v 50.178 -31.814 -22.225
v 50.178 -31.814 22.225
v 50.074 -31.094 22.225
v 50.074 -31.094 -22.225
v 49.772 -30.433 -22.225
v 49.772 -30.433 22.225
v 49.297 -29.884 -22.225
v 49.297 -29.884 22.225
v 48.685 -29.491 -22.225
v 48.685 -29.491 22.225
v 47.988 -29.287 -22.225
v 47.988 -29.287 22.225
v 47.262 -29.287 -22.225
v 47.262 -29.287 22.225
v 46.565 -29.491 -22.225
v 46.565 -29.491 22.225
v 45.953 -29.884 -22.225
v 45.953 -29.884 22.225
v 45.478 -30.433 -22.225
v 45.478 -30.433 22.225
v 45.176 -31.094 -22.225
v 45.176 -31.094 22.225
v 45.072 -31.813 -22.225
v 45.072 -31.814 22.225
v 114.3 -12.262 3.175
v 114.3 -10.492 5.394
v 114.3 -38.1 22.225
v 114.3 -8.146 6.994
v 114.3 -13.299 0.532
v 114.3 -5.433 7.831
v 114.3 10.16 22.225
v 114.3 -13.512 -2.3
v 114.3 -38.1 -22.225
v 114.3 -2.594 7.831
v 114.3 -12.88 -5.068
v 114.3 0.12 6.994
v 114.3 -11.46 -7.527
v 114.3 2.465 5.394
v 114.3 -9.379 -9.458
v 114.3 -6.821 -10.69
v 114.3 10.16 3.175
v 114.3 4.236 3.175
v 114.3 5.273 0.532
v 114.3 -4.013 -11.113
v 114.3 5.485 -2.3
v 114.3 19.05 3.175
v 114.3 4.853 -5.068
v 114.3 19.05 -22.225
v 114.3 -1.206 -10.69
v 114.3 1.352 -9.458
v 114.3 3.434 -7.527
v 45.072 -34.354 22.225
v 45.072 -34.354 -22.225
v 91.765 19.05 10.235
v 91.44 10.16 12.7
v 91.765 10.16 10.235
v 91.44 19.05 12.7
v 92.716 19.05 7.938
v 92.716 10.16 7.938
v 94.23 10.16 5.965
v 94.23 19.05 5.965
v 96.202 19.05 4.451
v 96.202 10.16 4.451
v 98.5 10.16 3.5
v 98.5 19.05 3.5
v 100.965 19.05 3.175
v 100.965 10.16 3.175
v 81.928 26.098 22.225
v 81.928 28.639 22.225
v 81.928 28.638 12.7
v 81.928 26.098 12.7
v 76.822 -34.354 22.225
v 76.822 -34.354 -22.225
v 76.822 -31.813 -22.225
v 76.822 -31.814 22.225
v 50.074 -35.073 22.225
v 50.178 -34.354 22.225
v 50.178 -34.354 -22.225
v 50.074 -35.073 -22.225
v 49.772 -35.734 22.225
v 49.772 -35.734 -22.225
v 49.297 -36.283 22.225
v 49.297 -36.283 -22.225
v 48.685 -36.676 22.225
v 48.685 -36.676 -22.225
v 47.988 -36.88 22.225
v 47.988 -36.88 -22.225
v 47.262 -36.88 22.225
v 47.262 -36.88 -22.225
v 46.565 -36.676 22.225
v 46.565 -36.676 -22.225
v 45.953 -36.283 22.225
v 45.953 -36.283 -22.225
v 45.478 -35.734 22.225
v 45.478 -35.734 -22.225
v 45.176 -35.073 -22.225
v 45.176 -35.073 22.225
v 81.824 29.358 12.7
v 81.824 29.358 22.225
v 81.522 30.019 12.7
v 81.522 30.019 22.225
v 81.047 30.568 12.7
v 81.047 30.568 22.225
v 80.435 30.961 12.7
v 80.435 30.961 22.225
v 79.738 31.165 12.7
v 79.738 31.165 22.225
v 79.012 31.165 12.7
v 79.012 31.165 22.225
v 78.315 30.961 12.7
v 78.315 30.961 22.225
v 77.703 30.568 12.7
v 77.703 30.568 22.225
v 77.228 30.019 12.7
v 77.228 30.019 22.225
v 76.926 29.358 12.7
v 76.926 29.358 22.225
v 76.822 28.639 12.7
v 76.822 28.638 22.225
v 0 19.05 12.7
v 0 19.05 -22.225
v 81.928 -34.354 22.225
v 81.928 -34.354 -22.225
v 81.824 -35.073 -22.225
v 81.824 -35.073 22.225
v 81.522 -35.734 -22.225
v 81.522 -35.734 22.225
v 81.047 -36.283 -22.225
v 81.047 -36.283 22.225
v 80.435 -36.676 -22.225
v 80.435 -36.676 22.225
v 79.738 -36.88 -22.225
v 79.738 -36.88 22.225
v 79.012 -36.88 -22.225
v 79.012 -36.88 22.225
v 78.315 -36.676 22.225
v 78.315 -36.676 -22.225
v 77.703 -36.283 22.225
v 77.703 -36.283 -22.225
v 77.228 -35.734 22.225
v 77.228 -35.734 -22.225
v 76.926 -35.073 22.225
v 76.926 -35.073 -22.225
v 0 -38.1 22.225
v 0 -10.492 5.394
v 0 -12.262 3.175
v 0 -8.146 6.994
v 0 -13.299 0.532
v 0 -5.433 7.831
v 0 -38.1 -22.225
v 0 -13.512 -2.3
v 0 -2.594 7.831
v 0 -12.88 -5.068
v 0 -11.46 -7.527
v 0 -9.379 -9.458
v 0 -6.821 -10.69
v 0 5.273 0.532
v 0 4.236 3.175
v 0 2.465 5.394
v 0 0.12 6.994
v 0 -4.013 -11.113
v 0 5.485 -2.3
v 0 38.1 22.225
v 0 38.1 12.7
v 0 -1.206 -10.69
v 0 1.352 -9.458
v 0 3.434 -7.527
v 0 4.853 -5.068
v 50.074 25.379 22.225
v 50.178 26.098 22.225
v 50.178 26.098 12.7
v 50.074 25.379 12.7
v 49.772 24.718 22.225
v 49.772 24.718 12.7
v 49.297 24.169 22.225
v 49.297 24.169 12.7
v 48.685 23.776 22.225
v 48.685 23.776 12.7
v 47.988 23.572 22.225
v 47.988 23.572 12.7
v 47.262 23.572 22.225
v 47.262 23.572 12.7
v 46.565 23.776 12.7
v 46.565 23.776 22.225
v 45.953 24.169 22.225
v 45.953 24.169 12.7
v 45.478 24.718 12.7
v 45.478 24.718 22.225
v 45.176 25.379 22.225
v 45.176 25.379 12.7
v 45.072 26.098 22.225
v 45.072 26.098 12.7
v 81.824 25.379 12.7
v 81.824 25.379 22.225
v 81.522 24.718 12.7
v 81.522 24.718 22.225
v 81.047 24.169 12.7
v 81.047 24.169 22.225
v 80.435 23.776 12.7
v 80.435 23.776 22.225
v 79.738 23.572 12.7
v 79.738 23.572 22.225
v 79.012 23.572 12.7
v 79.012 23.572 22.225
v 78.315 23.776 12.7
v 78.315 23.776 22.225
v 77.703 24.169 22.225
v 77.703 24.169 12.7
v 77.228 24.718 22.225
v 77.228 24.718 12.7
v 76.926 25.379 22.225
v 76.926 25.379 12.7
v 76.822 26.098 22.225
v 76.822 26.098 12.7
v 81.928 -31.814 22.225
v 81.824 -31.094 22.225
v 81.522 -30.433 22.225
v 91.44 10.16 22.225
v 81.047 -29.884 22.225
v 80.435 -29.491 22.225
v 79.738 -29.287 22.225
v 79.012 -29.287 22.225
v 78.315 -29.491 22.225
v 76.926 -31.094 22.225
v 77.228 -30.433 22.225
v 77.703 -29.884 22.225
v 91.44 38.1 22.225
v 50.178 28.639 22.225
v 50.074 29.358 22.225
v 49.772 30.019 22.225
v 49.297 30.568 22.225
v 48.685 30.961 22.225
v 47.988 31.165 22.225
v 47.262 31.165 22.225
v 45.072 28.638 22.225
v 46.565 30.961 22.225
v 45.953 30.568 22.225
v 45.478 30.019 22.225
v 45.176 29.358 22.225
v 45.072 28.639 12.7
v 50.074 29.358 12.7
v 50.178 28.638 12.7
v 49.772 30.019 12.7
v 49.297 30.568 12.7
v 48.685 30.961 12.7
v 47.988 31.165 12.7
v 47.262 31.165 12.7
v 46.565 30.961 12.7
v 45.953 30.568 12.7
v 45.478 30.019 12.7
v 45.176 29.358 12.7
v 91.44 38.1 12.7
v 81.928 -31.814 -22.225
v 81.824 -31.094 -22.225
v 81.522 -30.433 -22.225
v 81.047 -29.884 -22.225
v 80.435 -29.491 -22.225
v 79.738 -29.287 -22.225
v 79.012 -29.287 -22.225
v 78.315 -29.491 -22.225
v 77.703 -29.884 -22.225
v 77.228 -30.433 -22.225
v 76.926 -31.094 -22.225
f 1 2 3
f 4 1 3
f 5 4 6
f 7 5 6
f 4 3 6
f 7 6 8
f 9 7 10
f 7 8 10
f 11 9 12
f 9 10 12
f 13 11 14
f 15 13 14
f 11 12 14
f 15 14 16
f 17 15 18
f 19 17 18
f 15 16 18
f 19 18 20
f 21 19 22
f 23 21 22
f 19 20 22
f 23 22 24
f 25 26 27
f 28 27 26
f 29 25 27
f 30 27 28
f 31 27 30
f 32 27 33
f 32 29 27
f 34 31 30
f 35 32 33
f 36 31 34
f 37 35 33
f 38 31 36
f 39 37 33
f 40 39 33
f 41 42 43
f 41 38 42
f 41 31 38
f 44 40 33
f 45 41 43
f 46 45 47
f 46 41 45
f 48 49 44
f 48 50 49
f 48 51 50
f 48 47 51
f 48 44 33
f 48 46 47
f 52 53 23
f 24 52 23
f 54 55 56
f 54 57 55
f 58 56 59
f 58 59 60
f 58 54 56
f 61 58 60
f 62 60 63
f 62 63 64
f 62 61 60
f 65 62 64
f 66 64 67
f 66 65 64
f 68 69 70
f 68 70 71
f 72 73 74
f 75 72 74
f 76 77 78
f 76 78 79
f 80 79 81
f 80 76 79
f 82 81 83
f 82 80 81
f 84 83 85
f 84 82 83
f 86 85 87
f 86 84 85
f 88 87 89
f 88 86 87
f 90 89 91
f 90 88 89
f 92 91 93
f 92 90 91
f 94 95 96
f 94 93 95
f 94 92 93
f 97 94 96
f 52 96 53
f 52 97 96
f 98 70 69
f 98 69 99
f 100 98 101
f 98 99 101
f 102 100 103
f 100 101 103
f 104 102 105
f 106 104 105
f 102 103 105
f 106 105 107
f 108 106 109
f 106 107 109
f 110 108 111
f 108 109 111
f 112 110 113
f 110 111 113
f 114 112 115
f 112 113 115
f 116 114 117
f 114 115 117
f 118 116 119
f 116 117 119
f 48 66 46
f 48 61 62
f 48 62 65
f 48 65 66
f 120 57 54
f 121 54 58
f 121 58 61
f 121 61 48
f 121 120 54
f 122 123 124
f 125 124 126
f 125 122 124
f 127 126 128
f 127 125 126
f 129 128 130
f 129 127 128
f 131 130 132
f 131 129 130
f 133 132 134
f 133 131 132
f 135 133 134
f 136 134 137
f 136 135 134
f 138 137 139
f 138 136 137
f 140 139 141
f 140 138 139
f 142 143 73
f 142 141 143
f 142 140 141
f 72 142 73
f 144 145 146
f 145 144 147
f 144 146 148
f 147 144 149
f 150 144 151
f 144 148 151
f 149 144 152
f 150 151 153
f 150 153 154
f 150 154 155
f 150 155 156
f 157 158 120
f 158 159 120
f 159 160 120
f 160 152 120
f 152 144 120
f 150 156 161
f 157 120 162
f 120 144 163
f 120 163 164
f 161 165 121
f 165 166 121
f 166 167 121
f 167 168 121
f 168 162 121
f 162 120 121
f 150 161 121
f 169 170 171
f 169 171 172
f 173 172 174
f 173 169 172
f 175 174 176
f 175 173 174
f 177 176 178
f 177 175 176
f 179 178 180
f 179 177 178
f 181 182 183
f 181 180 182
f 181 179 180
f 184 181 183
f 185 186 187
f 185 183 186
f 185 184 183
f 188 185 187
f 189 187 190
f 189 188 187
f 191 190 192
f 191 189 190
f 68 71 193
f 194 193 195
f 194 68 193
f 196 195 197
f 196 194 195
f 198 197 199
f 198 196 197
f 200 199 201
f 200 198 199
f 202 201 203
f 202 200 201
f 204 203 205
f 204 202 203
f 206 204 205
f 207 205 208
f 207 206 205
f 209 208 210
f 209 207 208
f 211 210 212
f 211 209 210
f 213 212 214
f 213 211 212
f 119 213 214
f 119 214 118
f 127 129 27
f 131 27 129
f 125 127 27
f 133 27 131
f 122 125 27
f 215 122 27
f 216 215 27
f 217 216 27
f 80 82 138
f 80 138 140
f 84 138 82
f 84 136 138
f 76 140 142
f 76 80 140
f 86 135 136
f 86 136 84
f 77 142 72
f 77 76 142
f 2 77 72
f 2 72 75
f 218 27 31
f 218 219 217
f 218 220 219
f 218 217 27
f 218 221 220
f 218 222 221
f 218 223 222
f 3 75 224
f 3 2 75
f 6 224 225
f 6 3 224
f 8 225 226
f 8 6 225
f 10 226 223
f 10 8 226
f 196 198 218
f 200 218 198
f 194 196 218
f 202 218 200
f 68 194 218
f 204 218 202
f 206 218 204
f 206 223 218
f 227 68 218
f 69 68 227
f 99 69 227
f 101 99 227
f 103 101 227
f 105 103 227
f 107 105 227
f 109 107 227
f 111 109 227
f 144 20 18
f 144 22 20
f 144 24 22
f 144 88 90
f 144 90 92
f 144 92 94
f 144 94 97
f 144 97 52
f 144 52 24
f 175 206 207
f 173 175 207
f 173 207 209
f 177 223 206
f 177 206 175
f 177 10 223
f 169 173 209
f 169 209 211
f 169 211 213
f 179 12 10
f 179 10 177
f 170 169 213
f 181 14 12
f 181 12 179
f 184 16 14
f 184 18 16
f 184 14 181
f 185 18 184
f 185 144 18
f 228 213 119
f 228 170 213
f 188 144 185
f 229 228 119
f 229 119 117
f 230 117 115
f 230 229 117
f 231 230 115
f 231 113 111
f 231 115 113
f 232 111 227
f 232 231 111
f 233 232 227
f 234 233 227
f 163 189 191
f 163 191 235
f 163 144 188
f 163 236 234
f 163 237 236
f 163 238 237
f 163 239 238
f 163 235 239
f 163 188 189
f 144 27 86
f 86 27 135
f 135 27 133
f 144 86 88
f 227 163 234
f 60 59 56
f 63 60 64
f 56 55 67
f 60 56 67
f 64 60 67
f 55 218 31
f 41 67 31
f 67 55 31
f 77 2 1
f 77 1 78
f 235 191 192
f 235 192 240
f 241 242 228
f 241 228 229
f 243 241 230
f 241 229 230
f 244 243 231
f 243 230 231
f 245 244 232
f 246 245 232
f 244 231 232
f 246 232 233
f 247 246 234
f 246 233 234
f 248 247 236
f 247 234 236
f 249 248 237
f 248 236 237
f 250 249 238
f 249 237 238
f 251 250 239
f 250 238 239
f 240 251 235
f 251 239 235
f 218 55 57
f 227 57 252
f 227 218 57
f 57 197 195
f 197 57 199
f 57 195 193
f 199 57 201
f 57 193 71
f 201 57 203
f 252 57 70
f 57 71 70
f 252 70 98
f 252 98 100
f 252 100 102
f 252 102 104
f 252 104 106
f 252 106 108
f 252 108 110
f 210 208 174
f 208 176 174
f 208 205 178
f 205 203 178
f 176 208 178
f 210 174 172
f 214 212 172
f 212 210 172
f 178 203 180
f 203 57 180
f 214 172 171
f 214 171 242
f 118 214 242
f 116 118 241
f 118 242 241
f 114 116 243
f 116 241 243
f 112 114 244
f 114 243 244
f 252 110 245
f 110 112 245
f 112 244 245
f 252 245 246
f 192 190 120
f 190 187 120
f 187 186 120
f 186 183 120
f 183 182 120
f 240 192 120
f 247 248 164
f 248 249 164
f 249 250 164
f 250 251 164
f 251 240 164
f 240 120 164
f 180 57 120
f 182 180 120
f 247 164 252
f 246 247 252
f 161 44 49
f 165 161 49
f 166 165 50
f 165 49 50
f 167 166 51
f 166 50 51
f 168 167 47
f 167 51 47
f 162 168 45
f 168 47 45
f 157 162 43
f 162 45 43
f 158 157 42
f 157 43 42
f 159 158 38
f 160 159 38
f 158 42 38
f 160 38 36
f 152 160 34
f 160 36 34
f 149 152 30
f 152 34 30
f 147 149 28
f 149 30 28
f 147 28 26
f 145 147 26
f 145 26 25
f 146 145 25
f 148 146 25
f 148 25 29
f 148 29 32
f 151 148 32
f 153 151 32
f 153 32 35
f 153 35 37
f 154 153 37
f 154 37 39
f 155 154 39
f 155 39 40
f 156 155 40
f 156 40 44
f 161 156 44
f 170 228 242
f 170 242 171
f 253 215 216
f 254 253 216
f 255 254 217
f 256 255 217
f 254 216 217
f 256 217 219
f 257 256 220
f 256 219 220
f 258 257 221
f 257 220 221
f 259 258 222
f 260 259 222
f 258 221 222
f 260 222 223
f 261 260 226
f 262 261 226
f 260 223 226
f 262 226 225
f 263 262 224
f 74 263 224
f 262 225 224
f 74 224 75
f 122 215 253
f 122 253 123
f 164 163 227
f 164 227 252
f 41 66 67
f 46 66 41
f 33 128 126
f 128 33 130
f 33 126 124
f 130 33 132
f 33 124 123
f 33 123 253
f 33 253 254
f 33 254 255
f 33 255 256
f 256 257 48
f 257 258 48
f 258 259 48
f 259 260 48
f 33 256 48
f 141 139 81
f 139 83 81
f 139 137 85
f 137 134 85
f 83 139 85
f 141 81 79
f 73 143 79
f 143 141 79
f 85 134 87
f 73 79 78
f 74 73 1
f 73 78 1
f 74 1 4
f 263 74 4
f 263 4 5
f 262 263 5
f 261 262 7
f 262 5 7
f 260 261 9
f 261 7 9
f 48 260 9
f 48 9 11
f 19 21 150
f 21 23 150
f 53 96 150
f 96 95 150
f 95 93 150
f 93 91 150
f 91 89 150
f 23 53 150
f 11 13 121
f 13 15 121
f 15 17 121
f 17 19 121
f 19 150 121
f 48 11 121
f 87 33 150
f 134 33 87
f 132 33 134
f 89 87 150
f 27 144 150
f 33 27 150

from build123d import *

# Parameters (mm, degrees)
SKETCH1_W              = 44.45
SKETCH1_H              = 76.2
BOSS_EXTRUDE1_DEPTH    = 114.3
CUT_EXTRUDE1_REACH     = 124.516
SKETCH2_R              = 9.525
SKETCH3_W              = 22.86
SKETCH3_H              = 27.94
CUT_EXTRUDE2_DEPTH     = 19.05
CUT_EXTRUDE3_REACH     = 124.516
SKETCH4_W              = 34.925
SKETCH4_H              = 19.05
FILLET1_R              = 9.525
F_10_CLEARANCE_HOLE1_D = 5.1054
CUT_EXTRUDE4_REACH     = 130.421


with BuildPart() as part:
    # Sketch1 → Boss-Extrude1 (new body)
    with BuildSketch(Plane(origin=(0, 0, 0), x_dir=(0, 0, -1), z_dir=(1, 0, 0))):
        Rectangle(SKETCH1_W, SKETCH1_H)
    extrude(amount=BOSS_EXTRUDE1_DEPTH)

    # Sketch2 → Cut-Extrude1 (cut, up to next)
    with BuildSketch(Plane(origin=(114.3, 0, 0), x_dir=(0, 0, -1), z_dir=(1, 0, 0)), mode=Mode.PRIVATE) as cut_extrude1_sk1:
        with Locations((1.588, -4.0132)):
            Circle(SKETCH2_R)
    cut_extrude1_tool1 = extrude(cut_extrude1_sk1.sketch, amount=-CUT_EXTRUDE1_REACH, mode=Mode.PRIVATE) & part.part
    add(cut_extrude1_tool1.solids().sort_by_distance((114.3, -4.0132, -1.588))[0], mode=Mode.SUBTRACT)

    # Sketch3 → Cut-Extrude2 (cut)
    with BuildSketch(Plane.XY.offset(22.225)):
        with Locations((102.87, 24.13)):
            Rectangle(SKETCH3_W, SKETCH3_H)
    extrude(amount=-CUT_EXTRUDE2_DEPTH, mode=Mode.SUBTRACT)

    # Sketch4 → Cut-Extrude3 (cut, up to next)
    with BuildSketch(Plane(origin=(0, 0, 0), x_dir=(0, 0, -1), z_dir=(1, 0, 0)), mode=Mode.PRIVATE) as cut_extrude3_sk1:
        with Locations((4.7625, 28.575)):
            Rectangle(SKETCH4_W, SKETCH4_H)
    cut_extrude3_tool1 = extrude(cut_extrude3_sk1.sketch, amount=CUT_EXTRUDE3_REACH, mode=Mode.PRIVATE) & part.part
    add(cut_extrude3_tool1.solids().sort_by_distance((0, 28.575, -4.7625))[0], mode=Mode.SUBTRACT)

    # Fillet1
    fillet1_edges = [part.edges().sort_by_distance(p)[0] for p in [
        (91.44, 14.605, 3.175),
    ]]
    fillet(fillet1_edges, radius=FILLET1_R)

    # #10 Clearance Hole1 (through all)
    with Locations(Plane(origin=(0, 0, -22.225), x_dir=(-1, 0, 0), z_dir=(0, 0, -1))):
        with Locations((-47.625, 28.6385), (-79.375, -31.8135), (-47.625, -31.8135), (-79.375, 28.6385)):
            Hole(F_10_CLEARANCE_HOLE1_D / 2)

    # Sketch9 → Cut-Extrude4 (cut, up to next)
    with BuildSketch(Plane.XY.offset(22.225), mode=Mode.PRIVATE) as cut_extrude4_sk1:
        with BuildLine():
            Line((50.1777, 28.6385), (50.1777, 26.0985))
            ThreePointArc((50.1777, 26.0985), (47.625, 23.5458), (45.0723, 26.0985))
            Line((45.0723, 26.0985), (45.0723, 28.6385))
            ThreePointArc((45.0723, 28.6385), (47.625, 31.1912), (50.1777, 28.6385))
        make_face()
    cut_extrude4_tool1 = extrude(cut_extrude4_sk1.sketch, amount=-CUT_EXTRUDE4_REACH, mode=Mode.PRIVATE) & part.part
    # Sketch9 → Cut-Extrude4 (cut, up to next)
    with BuildSketch(Plane.XY.offset(22.225), mode=Mode.PRIVATE) as cut_extrude4_sk2:
        with BuildLine():
            Line((81.9277, 28.6385), (81.9277, 26.0985))
            ThreePointArc((81.9277, 26.0985), (79.375, 23.5458), (76.8223, 26.0985))
            Line((76.8223, 26.0985), (76.8223, 28.6385))
            ThreePointArc((76.8223, 28.6385), (79.375, 31.1912), (81.9277, 28.6385))
        make_face()
    cut_extrude4_tool2 = extrude(cut_extrude4_sk2.sketch, amount=-CUT_EXTRUDE4_REACH, mode=Mode.PRIVATE) & part.part
    # Sketch9 → Cut-Extrude4 (cut, up to next)
    with BuildSketch(Plane.XY.offset(22.225), mode=Mode.PRIVATE) as cut_extrude4_sk3:
        with BuildLine():
            Line((81.9277, -31.8135), (81.9277, -34.3535))
            ThreePointArc((81.9277, -34.3535), (79.375, -36.9062), (76.8223, -34.3535))
            Line((76.8223, -34.3535), (76.8223, -31.8135))
            ThreePointArc((76.8223, -31.8135), (79.375, -29.2608), (81.9277, -31.8135))
        make_face()
    cut_extrude4_tool3 = extrude(cut_extrude4_sk3.sketch, amount=-CUT_EXTRUDE4_REACH, mode=Mode.PRIVATE) & part.part
    # Sketch9 → Cut-Extrude4 (cut, up to next)
    with BuildSketch(Plane.XY.offset(22.225), mode=Mode.PRIVATE) as cut_extrude4_sk4:
        with BuildLine():
            Line((50.1777, -31.8135), (50.1777, -34.3535))
            ThreePointArc((50.1777, -34.3535), (47.625, -36.9062), (45.0723, -34.3535))
            Line((45.0723, -34.3535), (45.0723, -31.8135))
            ThreePointArc((45.0723, -31.8135), (47.625, -29.2608), (50.1777, -31.8135))
        make_face()
    cut_extrude4_tool4 = extrude(cut_extrude4_sk4.sketch, amount=-CUT_EXTRUDE4_REACH, mode=Mode.PRIVATE) & part.part
    add(cut_extrude4_tool1.solids().sort_by_distance((47.625, 27.3685, 22.225))[0], mode=Mode.SUBTRACT)
    add(cut_extrude4_tool2.solids().sort_by_distance((79.375, 27.3685, 22.225))[0], mode=Mode.SUBTRACT)
    add(cut_extrude4_tool3.solids().sort_by_distance((79.375, -33.0835, 22.225))[0], mode=Mode.SUBTRACT)
    add(cut_extrude4_tool4.solids().sort_by_distance((47.625, -33.0835, 22.225))[0], mode=Mode.SUBTRACT)


solid = part.part
